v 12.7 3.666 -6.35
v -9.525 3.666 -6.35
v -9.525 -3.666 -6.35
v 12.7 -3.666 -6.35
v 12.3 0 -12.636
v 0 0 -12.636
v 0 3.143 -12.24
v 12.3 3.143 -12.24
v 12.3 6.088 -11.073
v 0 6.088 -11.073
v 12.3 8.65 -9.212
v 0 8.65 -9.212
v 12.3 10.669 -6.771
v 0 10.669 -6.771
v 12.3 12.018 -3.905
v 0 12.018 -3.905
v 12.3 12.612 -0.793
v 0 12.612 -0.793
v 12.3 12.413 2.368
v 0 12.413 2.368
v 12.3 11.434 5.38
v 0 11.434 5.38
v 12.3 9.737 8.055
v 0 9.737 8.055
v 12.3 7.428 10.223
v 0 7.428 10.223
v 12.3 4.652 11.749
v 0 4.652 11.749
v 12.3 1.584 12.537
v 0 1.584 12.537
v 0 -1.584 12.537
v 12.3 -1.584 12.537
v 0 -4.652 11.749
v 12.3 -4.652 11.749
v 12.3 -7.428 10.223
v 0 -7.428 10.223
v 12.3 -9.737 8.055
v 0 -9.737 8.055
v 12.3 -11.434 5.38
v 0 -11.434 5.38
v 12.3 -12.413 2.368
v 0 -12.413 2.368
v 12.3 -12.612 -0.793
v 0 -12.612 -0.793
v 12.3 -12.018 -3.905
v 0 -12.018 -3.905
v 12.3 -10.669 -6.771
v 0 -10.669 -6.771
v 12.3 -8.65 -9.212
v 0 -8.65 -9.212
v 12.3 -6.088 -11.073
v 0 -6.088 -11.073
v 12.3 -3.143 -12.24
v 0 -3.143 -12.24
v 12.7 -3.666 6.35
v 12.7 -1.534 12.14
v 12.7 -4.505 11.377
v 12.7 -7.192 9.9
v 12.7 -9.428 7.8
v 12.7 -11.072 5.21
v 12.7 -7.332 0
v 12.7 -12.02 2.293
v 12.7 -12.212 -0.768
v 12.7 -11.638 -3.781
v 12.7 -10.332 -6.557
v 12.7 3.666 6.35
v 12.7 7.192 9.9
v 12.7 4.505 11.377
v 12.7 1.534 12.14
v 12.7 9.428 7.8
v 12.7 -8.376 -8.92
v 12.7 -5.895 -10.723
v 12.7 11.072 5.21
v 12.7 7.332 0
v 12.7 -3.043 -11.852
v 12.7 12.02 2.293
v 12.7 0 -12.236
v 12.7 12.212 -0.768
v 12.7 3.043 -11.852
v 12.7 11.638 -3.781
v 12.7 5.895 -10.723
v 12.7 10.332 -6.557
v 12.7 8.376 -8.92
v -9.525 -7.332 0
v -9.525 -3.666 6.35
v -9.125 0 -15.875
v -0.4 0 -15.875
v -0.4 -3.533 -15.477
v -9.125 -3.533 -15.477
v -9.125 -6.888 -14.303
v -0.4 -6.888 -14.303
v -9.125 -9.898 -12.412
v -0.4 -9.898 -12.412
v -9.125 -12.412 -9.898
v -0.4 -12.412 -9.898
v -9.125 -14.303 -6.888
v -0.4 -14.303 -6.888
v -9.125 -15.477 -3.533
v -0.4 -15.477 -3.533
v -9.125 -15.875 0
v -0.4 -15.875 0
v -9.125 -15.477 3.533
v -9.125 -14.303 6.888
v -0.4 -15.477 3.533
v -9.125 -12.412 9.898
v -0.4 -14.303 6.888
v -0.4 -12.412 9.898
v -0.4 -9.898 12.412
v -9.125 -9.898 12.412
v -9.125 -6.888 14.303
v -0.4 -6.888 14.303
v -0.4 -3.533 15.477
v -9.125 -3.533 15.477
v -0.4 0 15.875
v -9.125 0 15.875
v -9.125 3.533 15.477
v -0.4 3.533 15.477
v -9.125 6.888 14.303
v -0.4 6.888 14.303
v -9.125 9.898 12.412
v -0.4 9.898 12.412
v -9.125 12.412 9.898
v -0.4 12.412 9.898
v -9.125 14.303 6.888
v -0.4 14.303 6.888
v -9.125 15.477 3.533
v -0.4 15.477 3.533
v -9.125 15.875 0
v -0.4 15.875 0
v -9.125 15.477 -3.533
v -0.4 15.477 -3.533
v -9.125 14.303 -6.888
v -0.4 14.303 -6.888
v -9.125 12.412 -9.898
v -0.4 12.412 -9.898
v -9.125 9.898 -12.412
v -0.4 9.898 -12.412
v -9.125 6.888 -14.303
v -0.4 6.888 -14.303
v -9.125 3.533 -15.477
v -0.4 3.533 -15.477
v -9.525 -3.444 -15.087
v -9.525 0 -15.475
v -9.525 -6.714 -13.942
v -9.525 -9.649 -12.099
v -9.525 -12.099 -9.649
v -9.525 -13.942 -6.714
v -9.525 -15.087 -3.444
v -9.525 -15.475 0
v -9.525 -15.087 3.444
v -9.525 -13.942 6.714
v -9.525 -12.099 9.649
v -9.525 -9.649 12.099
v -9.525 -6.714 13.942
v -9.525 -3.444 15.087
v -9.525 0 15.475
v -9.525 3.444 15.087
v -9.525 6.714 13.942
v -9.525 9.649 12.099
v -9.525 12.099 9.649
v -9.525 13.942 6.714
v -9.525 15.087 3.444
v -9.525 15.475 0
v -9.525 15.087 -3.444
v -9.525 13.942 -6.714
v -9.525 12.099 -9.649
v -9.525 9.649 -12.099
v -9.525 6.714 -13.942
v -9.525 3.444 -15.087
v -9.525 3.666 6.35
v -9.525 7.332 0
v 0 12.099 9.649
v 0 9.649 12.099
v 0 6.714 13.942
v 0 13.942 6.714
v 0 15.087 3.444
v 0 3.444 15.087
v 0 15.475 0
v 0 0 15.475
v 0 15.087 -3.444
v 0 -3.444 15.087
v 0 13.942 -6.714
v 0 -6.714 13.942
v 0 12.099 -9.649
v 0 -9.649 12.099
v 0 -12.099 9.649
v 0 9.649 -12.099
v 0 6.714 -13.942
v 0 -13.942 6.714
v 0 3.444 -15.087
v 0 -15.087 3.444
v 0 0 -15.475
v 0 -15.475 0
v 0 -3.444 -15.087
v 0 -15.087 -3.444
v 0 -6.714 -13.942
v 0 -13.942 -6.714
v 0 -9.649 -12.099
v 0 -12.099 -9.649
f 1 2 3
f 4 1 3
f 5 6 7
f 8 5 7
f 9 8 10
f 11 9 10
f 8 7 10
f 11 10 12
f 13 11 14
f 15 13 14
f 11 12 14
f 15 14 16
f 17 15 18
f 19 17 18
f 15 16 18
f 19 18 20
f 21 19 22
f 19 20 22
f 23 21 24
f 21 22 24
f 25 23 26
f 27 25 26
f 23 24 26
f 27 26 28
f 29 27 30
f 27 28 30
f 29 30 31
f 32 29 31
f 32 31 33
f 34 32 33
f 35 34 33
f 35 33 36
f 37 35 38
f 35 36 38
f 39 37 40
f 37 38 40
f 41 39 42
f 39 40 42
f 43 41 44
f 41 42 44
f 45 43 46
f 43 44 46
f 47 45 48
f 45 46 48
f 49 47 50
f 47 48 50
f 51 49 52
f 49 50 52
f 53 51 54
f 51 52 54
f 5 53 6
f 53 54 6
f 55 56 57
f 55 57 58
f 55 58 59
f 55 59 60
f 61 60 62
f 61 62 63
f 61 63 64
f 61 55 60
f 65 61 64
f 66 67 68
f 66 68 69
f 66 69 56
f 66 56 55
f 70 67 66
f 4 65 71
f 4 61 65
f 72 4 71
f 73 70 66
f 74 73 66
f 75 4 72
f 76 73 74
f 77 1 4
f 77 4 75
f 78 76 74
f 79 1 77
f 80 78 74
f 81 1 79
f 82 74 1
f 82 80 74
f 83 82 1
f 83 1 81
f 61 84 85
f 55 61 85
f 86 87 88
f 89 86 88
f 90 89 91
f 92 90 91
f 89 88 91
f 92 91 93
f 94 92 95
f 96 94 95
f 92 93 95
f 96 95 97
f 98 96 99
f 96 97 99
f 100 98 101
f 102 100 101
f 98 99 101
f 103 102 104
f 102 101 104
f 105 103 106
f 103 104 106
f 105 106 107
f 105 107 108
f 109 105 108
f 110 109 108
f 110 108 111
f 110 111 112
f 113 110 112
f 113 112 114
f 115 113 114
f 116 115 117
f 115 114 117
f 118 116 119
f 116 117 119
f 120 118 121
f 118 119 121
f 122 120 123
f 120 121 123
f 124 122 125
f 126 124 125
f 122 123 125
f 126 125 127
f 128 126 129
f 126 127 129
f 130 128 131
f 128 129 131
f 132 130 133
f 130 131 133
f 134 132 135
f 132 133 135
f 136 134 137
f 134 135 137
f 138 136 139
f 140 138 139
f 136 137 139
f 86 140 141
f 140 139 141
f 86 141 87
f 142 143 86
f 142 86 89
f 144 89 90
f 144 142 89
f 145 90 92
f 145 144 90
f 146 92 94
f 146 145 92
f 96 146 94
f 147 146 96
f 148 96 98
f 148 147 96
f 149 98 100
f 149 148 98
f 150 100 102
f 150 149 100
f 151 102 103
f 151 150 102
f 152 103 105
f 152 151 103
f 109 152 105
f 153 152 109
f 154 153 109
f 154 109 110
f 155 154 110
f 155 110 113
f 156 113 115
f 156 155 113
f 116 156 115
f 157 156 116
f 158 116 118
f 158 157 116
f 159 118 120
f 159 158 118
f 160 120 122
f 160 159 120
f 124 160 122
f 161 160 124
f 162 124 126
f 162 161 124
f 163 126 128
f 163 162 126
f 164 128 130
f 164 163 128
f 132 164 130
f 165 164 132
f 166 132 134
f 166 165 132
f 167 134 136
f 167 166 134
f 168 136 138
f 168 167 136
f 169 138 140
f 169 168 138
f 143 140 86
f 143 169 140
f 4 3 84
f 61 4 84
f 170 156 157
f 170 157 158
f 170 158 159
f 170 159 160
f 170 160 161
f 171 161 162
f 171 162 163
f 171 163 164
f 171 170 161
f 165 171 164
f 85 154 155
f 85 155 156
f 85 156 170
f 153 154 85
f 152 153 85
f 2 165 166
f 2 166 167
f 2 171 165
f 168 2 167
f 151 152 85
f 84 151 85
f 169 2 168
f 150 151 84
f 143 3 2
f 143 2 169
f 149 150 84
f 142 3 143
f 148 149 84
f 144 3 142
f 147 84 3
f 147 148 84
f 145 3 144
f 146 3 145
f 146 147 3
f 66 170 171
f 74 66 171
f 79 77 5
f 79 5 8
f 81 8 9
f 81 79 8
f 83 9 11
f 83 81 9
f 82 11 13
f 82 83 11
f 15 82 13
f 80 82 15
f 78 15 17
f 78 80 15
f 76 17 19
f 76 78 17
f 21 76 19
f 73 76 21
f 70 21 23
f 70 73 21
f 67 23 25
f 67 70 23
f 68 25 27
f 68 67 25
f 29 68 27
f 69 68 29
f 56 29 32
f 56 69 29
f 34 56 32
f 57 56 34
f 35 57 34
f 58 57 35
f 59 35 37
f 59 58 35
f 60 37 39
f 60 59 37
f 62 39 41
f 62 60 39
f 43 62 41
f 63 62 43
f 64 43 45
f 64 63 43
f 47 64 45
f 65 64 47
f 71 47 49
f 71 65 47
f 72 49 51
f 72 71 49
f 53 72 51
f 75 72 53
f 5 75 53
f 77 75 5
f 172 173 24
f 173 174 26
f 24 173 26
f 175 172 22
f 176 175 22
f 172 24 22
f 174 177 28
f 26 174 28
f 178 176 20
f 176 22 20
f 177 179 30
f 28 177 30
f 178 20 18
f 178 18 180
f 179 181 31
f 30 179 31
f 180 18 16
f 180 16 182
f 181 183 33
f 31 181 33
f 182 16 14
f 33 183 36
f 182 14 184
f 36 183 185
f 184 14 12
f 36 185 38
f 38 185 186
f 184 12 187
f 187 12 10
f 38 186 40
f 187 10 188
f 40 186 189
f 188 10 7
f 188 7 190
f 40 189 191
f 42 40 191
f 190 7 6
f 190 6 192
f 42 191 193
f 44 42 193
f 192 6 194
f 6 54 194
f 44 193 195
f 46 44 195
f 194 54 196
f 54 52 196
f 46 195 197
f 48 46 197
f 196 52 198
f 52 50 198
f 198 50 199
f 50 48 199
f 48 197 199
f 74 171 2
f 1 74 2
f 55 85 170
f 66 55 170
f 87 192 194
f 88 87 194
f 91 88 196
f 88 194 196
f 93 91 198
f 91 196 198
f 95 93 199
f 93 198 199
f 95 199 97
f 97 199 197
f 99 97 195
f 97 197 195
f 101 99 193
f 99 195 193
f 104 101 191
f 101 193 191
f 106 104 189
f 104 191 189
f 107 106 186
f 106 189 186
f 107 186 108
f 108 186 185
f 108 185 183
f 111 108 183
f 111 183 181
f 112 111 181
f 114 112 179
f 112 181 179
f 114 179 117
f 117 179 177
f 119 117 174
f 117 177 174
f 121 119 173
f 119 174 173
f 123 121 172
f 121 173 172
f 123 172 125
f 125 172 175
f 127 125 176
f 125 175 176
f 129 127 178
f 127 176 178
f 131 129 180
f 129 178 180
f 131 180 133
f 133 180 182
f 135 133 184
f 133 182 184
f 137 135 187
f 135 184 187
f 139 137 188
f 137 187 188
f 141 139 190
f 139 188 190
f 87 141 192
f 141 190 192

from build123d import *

# Parameters (mm, degrees)
SKETCH1_R           = 12.6365
BOSS_EXTRUDE1_DEPTH = 12.7
SKETCH2_R           = 15.875
BOSS_EXTRUDE2_DEPTH = 9.525
CHAMFER1_SIZE       = 0.4
CUT_EXTRUDE1_DEPTH  = 32.590851128


with BuildPart() as part:
    # Sketch1 → Boss-Extrude1 (new body)
    with BuildSketch(Plane(origin=(0, 0, 0), x_dir=(0, 0, -1), z_dir=(1, 0, 0))):
        Circle(SKETCH1_R)
    extrude(amount=BOSS_EXTRUDE1_DEPTH)

    # Sketch2 → Boss-Extrude2 (add)
    with BuildSketch(Plane.ZY):
        with Locations(Location((0, 0, 0), (0, 0, 180))):
            Circle(SKETCH2_R)
    extrude(amount=BOSS_EXTRUDE2_DEPTH)

    # Chamfer1
    chamfer1_edges = [part.edges().sort_by_distance(p)[0] for p in [
        (12.7, 0, 12.6365),
        (0, 0, 15.875),
        (-9.525, 0, 15.875),
    ]]
    chamfer(chamfer1_edges, length=CHAMFER1_SIZE)

    # Sketch4 → Cut-Extrude1 (cut, through all)
    with BuildSketch(Plane.ZY.offset(9.525)):
        Polygon((0, 7.332348419), (-6.35, 3.666174209), (-6.35, -3.666174209), (0, -7.332348419), (6.35, -3.666174209), (6.35, 3.666174209), align=None)
    extrude(amount=-CUT_EXTRUDE1_DEPTH, mode=Mode.SUBTRACT)


solid = part.part
